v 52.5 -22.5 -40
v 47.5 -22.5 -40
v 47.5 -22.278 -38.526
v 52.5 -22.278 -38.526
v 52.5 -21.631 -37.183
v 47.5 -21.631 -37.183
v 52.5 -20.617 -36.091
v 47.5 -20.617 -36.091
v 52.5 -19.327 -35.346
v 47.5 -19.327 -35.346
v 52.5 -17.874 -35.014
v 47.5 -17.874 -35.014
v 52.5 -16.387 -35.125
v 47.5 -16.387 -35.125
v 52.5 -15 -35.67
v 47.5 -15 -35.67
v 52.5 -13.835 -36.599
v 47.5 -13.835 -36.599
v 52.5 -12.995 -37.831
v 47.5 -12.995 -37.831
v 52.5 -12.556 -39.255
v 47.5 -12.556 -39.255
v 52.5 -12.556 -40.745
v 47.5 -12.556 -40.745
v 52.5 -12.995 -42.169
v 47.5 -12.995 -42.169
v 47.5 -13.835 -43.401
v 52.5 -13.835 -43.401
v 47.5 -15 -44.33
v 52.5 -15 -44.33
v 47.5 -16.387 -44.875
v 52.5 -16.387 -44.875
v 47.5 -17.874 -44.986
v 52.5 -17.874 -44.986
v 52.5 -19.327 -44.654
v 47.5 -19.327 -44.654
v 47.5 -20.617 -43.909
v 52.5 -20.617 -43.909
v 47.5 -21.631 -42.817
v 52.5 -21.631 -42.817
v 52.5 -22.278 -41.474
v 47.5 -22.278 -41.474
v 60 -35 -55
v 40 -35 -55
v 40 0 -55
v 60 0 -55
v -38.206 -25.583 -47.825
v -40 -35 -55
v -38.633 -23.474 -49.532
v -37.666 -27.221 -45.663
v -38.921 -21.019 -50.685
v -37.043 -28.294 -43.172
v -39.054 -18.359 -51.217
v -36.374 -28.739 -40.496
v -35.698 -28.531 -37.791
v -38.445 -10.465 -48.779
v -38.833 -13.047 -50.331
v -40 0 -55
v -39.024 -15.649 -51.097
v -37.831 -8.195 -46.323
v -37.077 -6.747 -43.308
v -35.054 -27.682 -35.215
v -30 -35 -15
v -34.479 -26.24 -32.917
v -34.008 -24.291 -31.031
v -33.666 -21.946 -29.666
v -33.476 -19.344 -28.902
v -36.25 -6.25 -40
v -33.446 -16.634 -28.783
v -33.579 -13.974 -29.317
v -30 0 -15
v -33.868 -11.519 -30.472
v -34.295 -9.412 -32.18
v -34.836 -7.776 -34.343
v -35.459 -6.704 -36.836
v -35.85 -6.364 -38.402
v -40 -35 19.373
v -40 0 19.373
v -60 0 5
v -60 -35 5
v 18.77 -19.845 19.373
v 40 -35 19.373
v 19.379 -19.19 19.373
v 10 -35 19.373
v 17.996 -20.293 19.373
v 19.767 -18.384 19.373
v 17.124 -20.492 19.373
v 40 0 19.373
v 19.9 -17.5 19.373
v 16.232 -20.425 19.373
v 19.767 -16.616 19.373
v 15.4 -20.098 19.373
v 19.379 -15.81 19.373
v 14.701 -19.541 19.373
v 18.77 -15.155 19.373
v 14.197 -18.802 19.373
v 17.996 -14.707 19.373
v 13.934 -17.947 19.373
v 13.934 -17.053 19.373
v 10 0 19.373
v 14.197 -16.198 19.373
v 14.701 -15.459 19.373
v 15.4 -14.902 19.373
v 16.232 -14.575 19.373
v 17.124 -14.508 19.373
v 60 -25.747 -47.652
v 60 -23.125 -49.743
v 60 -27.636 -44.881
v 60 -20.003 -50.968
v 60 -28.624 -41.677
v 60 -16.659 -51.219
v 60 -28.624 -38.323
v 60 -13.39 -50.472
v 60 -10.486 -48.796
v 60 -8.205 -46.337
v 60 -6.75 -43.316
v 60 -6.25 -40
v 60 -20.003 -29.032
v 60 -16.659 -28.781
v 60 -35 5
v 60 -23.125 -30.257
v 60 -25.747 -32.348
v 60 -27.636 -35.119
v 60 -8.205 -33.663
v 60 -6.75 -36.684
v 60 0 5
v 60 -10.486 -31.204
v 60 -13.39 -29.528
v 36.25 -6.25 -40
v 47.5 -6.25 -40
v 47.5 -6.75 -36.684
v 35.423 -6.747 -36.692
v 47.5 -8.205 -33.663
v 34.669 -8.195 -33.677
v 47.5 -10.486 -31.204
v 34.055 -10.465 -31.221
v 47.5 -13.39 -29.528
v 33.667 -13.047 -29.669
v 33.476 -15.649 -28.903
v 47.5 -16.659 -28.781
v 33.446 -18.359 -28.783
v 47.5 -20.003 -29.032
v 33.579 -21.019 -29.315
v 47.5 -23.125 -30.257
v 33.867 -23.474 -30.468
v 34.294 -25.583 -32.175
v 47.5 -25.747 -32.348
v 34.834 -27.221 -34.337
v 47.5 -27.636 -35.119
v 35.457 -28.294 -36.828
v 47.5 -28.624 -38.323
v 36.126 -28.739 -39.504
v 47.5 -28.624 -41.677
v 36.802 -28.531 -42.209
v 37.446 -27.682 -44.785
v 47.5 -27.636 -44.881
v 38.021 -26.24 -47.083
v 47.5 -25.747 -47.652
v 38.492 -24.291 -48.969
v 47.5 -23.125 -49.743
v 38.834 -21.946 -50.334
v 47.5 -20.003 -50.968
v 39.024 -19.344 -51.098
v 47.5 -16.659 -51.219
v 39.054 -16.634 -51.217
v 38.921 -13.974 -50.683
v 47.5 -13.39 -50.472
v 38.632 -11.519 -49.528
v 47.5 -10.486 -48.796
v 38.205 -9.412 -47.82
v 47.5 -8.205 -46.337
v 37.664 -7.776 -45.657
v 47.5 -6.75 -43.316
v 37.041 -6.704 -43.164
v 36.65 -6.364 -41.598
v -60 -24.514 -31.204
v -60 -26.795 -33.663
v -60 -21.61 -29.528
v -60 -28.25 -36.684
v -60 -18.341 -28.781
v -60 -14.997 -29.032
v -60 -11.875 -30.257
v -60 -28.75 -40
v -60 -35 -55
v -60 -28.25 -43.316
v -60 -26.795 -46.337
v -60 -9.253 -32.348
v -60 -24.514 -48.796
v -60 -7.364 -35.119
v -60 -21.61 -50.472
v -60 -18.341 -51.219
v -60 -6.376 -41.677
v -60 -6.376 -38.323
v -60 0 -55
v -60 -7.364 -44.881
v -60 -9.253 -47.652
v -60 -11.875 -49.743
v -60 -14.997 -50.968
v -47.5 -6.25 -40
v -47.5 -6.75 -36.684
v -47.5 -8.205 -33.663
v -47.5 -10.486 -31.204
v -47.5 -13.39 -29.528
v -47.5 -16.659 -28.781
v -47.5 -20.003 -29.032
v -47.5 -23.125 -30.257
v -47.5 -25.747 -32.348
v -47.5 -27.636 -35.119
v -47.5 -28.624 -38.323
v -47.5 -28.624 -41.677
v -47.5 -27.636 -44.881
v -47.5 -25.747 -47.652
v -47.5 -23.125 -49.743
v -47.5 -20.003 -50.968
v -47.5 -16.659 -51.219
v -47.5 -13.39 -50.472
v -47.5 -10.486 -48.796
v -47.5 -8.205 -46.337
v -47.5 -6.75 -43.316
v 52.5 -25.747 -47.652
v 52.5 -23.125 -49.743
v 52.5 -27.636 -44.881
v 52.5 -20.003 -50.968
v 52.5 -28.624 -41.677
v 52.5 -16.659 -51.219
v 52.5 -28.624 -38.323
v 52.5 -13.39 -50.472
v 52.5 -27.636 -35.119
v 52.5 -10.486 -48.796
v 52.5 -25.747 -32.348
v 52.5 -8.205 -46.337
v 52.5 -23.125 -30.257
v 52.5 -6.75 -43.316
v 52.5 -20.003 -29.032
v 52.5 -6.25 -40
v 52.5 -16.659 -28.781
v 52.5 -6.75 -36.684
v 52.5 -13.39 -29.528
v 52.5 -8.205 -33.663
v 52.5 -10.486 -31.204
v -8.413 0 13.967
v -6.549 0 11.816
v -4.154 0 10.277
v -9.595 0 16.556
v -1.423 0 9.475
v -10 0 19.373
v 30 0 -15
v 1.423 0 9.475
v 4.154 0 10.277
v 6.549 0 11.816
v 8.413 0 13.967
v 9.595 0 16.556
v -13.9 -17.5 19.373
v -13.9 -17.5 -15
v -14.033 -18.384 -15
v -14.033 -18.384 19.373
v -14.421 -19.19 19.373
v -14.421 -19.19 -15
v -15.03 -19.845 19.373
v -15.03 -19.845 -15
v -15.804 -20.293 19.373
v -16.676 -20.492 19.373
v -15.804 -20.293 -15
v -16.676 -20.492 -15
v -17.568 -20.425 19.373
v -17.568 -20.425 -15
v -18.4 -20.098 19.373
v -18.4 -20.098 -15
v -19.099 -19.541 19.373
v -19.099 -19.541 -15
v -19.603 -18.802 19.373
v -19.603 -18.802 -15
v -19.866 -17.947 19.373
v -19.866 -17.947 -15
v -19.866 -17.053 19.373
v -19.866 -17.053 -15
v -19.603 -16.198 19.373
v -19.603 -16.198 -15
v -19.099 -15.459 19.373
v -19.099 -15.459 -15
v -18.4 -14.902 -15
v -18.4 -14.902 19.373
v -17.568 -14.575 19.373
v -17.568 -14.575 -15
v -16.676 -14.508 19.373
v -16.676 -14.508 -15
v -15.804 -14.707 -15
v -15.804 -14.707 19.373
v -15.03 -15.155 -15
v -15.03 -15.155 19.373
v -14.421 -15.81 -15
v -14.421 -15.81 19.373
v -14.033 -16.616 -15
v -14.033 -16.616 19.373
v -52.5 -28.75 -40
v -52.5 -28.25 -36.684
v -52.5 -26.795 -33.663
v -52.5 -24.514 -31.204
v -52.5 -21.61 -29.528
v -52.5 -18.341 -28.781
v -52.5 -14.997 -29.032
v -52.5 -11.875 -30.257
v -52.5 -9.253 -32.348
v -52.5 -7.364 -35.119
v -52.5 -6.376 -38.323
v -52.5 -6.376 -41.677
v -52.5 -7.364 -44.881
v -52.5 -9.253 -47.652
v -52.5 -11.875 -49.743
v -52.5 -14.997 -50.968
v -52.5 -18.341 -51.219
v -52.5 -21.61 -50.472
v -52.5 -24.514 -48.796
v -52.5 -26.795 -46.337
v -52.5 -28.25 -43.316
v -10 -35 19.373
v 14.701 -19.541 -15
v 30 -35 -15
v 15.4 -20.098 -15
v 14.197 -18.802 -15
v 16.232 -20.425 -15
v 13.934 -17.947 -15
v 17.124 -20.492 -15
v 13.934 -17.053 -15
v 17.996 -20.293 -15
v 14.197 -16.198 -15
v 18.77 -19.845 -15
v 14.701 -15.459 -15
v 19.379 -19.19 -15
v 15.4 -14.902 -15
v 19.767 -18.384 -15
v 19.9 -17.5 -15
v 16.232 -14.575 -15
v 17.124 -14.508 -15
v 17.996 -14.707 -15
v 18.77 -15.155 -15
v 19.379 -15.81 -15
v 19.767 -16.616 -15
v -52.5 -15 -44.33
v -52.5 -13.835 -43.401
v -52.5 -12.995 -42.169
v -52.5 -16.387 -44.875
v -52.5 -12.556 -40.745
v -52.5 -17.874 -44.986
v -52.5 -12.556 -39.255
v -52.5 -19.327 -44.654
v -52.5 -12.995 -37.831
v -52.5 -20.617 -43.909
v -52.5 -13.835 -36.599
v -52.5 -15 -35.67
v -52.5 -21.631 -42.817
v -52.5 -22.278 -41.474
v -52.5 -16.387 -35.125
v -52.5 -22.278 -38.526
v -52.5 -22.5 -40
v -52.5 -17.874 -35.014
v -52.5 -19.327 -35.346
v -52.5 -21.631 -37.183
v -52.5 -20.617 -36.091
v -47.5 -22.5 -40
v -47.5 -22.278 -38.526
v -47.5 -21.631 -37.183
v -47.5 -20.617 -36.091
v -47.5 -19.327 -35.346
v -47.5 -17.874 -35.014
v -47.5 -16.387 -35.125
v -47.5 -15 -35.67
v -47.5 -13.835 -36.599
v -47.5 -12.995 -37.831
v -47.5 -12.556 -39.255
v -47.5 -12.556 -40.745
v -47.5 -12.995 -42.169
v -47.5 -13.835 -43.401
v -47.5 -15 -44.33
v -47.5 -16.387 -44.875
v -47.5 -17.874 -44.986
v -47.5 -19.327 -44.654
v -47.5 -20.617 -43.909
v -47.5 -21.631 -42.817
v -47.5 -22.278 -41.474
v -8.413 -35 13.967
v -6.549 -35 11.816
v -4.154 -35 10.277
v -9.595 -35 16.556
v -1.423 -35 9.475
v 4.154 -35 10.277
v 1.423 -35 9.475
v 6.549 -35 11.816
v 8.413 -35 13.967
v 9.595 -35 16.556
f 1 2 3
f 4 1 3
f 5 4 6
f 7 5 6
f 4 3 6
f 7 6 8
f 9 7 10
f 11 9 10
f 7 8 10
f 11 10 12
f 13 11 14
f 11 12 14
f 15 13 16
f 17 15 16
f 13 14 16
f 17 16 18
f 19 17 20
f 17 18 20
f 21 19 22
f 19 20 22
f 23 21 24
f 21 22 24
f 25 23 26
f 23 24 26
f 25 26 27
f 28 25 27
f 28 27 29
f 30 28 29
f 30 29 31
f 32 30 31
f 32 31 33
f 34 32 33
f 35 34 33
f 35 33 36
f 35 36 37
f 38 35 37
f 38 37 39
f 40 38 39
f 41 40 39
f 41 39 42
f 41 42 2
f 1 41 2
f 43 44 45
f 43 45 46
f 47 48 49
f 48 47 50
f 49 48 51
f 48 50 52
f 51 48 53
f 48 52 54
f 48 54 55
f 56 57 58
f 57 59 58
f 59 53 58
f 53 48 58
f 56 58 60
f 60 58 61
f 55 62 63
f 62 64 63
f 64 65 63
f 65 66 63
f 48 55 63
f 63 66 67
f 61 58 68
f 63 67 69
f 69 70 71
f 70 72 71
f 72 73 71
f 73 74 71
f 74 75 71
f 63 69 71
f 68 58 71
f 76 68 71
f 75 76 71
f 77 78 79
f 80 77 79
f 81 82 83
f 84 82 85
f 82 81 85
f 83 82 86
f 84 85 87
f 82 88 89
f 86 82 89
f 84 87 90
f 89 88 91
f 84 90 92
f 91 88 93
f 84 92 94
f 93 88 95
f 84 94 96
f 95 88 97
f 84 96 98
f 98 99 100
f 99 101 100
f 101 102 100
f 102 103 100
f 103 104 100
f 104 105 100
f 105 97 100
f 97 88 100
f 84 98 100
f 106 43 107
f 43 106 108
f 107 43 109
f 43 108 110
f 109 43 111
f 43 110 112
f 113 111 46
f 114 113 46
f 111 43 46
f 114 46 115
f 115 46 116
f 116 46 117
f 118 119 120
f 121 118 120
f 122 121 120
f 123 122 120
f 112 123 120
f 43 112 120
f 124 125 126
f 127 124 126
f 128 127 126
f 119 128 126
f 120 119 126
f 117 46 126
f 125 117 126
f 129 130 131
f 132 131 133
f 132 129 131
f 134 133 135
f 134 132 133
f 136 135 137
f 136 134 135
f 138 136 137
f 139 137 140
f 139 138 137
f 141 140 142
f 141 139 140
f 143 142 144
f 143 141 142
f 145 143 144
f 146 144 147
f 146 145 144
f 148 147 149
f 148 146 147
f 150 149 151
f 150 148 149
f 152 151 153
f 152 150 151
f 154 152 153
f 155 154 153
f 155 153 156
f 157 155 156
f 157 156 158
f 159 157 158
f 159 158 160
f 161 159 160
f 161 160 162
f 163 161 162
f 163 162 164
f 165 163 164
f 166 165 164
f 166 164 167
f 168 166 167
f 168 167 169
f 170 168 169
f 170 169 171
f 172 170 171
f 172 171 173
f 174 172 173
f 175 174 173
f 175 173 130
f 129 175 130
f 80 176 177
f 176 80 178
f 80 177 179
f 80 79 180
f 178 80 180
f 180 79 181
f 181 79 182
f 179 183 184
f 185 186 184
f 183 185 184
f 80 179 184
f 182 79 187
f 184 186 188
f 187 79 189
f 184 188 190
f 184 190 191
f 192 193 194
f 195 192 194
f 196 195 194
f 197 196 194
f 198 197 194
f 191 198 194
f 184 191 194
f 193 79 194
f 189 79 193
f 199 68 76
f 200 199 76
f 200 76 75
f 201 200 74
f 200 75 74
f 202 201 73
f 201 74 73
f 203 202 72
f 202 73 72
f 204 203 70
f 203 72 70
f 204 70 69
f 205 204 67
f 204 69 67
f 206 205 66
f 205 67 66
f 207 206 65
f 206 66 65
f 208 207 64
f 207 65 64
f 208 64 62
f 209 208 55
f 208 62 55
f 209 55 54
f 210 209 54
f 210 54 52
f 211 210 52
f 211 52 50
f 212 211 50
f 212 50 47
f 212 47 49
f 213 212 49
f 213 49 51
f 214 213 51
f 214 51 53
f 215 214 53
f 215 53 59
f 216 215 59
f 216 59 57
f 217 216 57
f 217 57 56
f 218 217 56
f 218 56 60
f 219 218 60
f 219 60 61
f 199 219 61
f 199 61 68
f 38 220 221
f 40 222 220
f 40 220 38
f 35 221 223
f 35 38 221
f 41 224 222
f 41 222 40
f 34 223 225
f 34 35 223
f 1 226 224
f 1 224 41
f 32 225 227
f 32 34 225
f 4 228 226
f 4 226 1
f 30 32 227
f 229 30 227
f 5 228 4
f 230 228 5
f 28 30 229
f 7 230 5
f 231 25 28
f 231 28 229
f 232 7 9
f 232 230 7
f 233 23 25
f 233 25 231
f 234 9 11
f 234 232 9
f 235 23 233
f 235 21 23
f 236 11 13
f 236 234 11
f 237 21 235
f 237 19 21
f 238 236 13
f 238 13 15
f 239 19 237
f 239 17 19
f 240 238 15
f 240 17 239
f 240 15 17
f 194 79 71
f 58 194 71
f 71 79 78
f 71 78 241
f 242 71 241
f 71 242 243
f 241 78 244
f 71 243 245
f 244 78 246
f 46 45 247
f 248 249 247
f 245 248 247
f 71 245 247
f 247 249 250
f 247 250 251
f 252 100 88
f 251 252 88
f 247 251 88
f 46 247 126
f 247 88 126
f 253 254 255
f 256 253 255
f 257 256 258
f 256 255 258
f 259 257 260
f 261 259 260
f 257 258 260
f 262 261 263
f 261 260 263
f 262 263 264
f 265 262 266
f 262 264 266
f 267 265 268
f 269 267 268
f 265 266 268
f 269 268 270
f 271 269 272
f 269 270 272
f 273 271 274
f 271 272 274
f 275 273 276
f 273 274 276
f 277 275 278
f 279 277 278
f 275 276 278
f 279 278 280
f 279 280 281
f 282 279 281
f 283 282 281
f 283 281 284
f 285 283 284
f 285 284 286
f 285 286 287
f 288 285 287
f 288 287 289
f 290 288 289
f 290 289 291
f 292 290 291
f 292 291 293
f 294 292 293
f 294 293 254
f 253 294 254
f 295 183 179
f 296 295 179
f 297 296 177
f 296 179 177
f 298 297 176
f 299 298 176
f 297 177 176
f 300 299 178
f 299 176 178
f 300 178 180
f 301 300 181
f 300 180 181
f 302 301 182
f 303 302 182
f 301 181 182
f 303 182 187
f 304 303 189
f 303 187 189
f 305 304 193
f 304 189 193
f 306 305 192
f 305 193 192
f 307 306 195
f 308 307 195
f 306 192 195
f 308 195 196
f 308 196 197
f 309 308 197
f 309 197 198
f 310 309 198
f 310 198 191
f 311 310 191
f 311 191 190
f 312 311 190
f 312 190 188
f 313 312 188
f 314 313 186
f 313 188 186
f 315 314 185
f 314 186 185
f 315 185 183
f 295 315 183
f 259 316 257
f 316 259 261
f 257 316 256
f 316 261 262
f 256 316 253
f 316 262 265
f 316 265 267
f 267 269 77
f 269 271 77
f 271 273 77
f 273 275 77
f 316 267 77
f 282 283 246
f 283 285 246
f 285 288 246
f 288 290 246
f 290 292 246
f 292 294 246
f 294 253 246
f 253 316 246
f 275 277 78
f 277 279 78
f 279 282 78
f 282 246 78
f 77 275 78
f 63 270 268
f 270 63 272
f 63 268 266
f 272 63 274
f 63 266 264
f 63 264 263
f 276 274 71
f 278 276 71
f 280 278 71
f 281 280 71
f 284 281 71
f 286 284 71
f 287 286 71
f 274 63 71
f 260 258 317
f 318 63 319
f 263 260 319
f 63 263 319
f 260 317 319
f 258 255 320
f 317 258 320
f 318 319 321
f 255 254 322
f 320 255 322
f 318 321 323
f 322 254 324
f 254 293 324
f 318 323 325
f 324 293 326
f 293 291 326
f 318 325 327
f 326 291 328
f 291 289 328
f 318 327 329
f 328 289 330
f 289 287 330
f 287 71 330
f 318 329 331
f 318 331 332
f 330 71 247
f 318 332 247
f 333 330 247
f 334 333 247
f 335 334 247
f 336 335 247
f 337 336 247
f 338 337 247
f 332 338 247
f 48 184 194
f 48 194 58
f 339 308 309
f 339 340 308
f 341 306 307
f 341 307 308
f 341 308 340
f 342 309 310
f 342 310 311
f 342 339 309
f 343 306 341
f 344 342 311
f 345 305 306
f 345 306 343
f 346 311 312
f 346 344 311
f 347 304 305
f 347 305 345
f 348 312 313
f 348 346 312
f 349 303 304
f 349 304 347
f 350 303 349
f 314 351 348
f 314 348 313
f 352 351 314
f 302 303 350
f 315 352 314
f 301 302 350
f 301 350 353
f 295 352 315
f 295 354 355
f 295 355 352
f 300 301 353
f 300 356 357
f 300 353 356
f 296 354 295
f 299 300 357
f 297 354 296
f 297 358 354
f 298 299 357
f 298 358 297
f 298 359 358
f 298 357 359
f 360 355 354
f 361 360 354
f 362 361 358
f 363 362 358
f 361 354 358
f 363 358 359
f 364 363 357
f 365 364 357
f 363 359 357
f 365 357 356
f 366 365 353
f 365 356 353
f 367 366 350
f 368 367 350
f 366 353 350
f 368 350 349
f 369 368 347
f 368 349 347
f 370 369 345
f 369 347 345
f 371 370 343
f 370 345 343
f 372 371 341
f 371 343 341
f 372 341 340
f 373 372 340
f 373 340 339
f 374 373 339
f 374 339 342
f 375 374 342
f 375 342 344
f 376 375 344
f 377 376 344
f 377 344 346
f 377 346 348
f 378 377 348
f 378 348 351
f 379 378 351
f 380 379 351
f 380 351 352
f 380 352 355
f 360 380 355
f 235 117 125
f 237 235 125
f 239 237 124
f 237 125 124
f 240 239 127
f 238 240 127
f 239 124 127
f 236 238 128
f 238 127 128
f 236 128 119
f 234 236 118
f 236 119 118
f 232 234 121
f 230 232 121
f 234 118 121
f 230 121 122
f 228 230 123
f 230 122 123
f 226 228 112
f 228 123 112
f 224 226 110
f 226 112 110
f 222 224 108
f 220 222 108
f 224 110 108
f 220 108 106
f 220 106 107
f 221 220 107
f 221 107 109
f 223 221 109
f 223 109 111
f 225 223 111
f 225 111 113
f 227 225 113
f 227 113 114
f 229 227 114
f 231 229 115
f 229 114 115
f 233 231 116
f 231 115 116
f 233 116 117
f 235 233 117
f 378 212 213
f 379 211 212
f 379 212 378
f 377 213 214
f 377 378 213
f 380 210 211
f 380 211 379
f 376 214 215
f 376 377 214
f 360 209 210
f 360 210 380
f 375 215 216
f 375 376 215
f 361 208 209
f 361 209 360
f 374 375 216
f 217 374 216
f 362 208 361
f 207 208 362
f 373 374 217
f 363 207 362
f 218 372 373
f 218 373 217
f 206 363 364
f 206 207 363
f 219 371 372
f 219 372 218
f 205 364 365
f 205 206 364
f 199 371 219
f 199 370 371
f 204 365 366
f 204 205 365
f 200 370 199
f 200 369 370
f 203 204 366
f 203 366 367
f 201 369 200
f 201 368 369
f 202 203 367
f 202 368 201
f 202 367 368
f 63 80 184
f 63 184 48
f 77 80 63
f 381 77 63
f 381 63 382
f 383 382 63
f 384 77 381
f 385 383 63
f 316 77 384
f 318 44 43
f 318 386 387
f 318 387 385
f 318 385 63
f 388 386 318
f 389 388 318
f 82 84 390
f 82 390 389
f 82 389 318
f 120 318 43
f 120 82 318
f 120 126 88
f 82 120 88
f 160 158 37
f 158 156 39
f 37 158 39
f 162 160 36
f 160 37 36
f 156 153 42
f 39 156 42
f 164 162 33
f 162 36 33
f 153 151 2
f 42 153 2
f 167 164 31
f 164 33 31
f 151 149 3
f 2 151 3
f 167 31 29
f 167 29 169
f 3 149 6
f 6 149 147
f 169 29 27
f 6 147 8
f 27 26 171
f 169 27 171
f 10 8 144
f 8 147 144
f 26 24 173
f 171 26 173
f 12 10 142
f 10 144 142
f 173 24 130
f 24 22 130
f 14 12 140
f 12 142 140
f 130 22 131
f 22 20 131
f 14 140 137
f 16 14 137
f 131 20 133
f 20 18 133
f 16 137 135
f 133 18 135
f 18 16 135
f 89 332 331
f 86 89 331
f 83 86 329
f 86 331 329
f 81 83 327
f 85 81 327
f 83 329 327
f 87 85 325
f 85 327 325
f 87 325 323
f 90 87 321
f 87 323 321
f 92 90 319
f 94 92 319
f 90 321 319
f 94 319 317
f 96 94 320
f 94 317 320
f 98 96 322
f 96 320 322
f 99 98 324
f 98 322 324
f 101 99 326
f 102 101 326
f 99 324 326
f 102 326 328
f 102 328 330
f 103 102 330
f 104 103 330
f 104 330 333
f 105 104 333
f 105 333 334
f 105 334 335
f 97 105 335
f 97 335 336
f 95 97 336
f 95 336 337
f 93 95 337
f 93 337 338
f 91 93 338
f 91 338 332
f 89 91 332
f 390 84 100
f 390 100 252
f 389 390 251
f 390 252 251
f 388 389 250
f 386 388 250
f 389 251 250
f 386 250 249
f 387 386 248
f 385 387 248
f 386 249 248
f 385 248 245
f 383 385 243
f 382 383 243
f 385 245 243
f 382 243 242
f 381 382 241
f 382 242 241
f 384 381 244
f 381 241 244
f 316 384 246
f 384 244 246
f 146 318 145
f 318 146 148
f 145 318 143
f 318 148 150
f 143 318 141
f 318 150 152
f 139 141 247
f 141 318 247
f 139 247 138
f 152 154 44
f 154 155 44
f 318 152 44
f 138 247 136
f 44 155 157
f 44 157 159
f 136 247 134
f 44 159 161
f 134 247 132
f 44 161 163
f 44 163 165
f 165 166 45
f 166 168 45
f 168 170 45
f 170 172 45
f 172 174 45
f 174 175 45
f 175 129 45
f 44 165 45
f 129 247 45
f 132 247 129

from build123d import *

# Parameters (mm, degrees)
F1_DEPTH  = 35
F2_R      = 3
F3_DEPTH  = 34.3740698971
F4_R      = 5
F5_DEPTH  = 120.001
F6_R      = 11.25
F7_DEPTH  = 7.5
F8_R      = 11.25
F9_DEPTH  = 7.5
F10_R     = 11.25
F11_DEPTH = 47.5
F12_R     = 11.25
F13_DEPTH = 47.5


with BuildPart() as f1:
    # F0 (on Front) → F1 (new body)
    with BuildSketch(Plane.XZ):
        with BuildLine():
            Line((-40, 19.3730698971), (-60, 5))
            Line((-60, 5), (-60, 0))
            Line((-60, 0), (-60, -55))
            Line((-60, -55), (-40, -55))
            Line((-40, -55), (-30, -15))
            Line((-30, -15), (0, -15))
            Line((0, -15), (30, -15))
            Line((30, -15), (40, -55))
            Line((40, -55), (60, -55))
            Line((60, -55), (60, 0))
            Line((60, 0), (60, 5))
            Line((60, 5), (40, 19.3730698971))
            Line((40, 19.3730698971), (10, 19.3730698971))
            ThreePointArc((10, 19.3730698971), (0, 9.3730698971), (-10, 19.3730698971))
            Line((-10, 19.3730698971), (-40, 19.3730698971))
        make_face()
    extrude(amount=F1_DEPTH)

    # F2 (on face) → F3 (cut, through all)
    with BuildSketch(Plane(origin=(0, 0, -15), x_dir=(1, 0, 0), z_dir=(0, 0, -1))):
        with Locations((-16.9, 17.5)):
            Circle(F2_R)
        with Locations((16.9, 17.5)):
            Circle(F2_R)
    extrude(amount=-F3_DEPTH, mode=Mode.SUBTRACT)

    # F4 (on face) → F5 (cut, through all)
    with BuildSketch(Plane(origin=(-60, 0, 0), x_dir=(0, -1, 0), z_dir=(-1, 0, 0))):
        with Locations((17.5, -40)):
            Circle(F4_R)
    extrude(amount=-F5_DEPTH, mode=Mode.SUBTRACT)

    # F6 (on face) → F7 (cut)
    with BuildSketch(Plane(origin=(-60, 0, 0), x_dir=(0, -1, 0), z_dir=(-1, 0, 0))):
        with Locations((17.5, -40)):
            Circle(F6_R)
    extrude(amount=-F7_DEPTH, mode=Mode.SUBTRACT)

    # F8 (on face) → F9 (cut)
    with BuildSketch(Plane.YZ.offset(60)):
        with Locations((-17.5, -40)):
            Circle(F8_R)
    extrude(amount=-F9_DEPTH, mode=Mode.SUBTRACT)

    # F10 (on Right) → F11 (cut)
    with BuildSketch(Plane.YZ):
        with Locations((-17.5, -40)):
            Circle(F10_R)
    extrude(amount=-F11_DEPTH, mode=Mode.SUBTRACT)

    # F12 (on Right) → F13 (cut)
    with BuildSketch(Plane.YZ):
        with Locations((-17.5, -40)):
            Circle(F12_R)
    extrude(amount=F13_DEPTH, mode=Mode.SUBTRACT)


solid = f1.part
